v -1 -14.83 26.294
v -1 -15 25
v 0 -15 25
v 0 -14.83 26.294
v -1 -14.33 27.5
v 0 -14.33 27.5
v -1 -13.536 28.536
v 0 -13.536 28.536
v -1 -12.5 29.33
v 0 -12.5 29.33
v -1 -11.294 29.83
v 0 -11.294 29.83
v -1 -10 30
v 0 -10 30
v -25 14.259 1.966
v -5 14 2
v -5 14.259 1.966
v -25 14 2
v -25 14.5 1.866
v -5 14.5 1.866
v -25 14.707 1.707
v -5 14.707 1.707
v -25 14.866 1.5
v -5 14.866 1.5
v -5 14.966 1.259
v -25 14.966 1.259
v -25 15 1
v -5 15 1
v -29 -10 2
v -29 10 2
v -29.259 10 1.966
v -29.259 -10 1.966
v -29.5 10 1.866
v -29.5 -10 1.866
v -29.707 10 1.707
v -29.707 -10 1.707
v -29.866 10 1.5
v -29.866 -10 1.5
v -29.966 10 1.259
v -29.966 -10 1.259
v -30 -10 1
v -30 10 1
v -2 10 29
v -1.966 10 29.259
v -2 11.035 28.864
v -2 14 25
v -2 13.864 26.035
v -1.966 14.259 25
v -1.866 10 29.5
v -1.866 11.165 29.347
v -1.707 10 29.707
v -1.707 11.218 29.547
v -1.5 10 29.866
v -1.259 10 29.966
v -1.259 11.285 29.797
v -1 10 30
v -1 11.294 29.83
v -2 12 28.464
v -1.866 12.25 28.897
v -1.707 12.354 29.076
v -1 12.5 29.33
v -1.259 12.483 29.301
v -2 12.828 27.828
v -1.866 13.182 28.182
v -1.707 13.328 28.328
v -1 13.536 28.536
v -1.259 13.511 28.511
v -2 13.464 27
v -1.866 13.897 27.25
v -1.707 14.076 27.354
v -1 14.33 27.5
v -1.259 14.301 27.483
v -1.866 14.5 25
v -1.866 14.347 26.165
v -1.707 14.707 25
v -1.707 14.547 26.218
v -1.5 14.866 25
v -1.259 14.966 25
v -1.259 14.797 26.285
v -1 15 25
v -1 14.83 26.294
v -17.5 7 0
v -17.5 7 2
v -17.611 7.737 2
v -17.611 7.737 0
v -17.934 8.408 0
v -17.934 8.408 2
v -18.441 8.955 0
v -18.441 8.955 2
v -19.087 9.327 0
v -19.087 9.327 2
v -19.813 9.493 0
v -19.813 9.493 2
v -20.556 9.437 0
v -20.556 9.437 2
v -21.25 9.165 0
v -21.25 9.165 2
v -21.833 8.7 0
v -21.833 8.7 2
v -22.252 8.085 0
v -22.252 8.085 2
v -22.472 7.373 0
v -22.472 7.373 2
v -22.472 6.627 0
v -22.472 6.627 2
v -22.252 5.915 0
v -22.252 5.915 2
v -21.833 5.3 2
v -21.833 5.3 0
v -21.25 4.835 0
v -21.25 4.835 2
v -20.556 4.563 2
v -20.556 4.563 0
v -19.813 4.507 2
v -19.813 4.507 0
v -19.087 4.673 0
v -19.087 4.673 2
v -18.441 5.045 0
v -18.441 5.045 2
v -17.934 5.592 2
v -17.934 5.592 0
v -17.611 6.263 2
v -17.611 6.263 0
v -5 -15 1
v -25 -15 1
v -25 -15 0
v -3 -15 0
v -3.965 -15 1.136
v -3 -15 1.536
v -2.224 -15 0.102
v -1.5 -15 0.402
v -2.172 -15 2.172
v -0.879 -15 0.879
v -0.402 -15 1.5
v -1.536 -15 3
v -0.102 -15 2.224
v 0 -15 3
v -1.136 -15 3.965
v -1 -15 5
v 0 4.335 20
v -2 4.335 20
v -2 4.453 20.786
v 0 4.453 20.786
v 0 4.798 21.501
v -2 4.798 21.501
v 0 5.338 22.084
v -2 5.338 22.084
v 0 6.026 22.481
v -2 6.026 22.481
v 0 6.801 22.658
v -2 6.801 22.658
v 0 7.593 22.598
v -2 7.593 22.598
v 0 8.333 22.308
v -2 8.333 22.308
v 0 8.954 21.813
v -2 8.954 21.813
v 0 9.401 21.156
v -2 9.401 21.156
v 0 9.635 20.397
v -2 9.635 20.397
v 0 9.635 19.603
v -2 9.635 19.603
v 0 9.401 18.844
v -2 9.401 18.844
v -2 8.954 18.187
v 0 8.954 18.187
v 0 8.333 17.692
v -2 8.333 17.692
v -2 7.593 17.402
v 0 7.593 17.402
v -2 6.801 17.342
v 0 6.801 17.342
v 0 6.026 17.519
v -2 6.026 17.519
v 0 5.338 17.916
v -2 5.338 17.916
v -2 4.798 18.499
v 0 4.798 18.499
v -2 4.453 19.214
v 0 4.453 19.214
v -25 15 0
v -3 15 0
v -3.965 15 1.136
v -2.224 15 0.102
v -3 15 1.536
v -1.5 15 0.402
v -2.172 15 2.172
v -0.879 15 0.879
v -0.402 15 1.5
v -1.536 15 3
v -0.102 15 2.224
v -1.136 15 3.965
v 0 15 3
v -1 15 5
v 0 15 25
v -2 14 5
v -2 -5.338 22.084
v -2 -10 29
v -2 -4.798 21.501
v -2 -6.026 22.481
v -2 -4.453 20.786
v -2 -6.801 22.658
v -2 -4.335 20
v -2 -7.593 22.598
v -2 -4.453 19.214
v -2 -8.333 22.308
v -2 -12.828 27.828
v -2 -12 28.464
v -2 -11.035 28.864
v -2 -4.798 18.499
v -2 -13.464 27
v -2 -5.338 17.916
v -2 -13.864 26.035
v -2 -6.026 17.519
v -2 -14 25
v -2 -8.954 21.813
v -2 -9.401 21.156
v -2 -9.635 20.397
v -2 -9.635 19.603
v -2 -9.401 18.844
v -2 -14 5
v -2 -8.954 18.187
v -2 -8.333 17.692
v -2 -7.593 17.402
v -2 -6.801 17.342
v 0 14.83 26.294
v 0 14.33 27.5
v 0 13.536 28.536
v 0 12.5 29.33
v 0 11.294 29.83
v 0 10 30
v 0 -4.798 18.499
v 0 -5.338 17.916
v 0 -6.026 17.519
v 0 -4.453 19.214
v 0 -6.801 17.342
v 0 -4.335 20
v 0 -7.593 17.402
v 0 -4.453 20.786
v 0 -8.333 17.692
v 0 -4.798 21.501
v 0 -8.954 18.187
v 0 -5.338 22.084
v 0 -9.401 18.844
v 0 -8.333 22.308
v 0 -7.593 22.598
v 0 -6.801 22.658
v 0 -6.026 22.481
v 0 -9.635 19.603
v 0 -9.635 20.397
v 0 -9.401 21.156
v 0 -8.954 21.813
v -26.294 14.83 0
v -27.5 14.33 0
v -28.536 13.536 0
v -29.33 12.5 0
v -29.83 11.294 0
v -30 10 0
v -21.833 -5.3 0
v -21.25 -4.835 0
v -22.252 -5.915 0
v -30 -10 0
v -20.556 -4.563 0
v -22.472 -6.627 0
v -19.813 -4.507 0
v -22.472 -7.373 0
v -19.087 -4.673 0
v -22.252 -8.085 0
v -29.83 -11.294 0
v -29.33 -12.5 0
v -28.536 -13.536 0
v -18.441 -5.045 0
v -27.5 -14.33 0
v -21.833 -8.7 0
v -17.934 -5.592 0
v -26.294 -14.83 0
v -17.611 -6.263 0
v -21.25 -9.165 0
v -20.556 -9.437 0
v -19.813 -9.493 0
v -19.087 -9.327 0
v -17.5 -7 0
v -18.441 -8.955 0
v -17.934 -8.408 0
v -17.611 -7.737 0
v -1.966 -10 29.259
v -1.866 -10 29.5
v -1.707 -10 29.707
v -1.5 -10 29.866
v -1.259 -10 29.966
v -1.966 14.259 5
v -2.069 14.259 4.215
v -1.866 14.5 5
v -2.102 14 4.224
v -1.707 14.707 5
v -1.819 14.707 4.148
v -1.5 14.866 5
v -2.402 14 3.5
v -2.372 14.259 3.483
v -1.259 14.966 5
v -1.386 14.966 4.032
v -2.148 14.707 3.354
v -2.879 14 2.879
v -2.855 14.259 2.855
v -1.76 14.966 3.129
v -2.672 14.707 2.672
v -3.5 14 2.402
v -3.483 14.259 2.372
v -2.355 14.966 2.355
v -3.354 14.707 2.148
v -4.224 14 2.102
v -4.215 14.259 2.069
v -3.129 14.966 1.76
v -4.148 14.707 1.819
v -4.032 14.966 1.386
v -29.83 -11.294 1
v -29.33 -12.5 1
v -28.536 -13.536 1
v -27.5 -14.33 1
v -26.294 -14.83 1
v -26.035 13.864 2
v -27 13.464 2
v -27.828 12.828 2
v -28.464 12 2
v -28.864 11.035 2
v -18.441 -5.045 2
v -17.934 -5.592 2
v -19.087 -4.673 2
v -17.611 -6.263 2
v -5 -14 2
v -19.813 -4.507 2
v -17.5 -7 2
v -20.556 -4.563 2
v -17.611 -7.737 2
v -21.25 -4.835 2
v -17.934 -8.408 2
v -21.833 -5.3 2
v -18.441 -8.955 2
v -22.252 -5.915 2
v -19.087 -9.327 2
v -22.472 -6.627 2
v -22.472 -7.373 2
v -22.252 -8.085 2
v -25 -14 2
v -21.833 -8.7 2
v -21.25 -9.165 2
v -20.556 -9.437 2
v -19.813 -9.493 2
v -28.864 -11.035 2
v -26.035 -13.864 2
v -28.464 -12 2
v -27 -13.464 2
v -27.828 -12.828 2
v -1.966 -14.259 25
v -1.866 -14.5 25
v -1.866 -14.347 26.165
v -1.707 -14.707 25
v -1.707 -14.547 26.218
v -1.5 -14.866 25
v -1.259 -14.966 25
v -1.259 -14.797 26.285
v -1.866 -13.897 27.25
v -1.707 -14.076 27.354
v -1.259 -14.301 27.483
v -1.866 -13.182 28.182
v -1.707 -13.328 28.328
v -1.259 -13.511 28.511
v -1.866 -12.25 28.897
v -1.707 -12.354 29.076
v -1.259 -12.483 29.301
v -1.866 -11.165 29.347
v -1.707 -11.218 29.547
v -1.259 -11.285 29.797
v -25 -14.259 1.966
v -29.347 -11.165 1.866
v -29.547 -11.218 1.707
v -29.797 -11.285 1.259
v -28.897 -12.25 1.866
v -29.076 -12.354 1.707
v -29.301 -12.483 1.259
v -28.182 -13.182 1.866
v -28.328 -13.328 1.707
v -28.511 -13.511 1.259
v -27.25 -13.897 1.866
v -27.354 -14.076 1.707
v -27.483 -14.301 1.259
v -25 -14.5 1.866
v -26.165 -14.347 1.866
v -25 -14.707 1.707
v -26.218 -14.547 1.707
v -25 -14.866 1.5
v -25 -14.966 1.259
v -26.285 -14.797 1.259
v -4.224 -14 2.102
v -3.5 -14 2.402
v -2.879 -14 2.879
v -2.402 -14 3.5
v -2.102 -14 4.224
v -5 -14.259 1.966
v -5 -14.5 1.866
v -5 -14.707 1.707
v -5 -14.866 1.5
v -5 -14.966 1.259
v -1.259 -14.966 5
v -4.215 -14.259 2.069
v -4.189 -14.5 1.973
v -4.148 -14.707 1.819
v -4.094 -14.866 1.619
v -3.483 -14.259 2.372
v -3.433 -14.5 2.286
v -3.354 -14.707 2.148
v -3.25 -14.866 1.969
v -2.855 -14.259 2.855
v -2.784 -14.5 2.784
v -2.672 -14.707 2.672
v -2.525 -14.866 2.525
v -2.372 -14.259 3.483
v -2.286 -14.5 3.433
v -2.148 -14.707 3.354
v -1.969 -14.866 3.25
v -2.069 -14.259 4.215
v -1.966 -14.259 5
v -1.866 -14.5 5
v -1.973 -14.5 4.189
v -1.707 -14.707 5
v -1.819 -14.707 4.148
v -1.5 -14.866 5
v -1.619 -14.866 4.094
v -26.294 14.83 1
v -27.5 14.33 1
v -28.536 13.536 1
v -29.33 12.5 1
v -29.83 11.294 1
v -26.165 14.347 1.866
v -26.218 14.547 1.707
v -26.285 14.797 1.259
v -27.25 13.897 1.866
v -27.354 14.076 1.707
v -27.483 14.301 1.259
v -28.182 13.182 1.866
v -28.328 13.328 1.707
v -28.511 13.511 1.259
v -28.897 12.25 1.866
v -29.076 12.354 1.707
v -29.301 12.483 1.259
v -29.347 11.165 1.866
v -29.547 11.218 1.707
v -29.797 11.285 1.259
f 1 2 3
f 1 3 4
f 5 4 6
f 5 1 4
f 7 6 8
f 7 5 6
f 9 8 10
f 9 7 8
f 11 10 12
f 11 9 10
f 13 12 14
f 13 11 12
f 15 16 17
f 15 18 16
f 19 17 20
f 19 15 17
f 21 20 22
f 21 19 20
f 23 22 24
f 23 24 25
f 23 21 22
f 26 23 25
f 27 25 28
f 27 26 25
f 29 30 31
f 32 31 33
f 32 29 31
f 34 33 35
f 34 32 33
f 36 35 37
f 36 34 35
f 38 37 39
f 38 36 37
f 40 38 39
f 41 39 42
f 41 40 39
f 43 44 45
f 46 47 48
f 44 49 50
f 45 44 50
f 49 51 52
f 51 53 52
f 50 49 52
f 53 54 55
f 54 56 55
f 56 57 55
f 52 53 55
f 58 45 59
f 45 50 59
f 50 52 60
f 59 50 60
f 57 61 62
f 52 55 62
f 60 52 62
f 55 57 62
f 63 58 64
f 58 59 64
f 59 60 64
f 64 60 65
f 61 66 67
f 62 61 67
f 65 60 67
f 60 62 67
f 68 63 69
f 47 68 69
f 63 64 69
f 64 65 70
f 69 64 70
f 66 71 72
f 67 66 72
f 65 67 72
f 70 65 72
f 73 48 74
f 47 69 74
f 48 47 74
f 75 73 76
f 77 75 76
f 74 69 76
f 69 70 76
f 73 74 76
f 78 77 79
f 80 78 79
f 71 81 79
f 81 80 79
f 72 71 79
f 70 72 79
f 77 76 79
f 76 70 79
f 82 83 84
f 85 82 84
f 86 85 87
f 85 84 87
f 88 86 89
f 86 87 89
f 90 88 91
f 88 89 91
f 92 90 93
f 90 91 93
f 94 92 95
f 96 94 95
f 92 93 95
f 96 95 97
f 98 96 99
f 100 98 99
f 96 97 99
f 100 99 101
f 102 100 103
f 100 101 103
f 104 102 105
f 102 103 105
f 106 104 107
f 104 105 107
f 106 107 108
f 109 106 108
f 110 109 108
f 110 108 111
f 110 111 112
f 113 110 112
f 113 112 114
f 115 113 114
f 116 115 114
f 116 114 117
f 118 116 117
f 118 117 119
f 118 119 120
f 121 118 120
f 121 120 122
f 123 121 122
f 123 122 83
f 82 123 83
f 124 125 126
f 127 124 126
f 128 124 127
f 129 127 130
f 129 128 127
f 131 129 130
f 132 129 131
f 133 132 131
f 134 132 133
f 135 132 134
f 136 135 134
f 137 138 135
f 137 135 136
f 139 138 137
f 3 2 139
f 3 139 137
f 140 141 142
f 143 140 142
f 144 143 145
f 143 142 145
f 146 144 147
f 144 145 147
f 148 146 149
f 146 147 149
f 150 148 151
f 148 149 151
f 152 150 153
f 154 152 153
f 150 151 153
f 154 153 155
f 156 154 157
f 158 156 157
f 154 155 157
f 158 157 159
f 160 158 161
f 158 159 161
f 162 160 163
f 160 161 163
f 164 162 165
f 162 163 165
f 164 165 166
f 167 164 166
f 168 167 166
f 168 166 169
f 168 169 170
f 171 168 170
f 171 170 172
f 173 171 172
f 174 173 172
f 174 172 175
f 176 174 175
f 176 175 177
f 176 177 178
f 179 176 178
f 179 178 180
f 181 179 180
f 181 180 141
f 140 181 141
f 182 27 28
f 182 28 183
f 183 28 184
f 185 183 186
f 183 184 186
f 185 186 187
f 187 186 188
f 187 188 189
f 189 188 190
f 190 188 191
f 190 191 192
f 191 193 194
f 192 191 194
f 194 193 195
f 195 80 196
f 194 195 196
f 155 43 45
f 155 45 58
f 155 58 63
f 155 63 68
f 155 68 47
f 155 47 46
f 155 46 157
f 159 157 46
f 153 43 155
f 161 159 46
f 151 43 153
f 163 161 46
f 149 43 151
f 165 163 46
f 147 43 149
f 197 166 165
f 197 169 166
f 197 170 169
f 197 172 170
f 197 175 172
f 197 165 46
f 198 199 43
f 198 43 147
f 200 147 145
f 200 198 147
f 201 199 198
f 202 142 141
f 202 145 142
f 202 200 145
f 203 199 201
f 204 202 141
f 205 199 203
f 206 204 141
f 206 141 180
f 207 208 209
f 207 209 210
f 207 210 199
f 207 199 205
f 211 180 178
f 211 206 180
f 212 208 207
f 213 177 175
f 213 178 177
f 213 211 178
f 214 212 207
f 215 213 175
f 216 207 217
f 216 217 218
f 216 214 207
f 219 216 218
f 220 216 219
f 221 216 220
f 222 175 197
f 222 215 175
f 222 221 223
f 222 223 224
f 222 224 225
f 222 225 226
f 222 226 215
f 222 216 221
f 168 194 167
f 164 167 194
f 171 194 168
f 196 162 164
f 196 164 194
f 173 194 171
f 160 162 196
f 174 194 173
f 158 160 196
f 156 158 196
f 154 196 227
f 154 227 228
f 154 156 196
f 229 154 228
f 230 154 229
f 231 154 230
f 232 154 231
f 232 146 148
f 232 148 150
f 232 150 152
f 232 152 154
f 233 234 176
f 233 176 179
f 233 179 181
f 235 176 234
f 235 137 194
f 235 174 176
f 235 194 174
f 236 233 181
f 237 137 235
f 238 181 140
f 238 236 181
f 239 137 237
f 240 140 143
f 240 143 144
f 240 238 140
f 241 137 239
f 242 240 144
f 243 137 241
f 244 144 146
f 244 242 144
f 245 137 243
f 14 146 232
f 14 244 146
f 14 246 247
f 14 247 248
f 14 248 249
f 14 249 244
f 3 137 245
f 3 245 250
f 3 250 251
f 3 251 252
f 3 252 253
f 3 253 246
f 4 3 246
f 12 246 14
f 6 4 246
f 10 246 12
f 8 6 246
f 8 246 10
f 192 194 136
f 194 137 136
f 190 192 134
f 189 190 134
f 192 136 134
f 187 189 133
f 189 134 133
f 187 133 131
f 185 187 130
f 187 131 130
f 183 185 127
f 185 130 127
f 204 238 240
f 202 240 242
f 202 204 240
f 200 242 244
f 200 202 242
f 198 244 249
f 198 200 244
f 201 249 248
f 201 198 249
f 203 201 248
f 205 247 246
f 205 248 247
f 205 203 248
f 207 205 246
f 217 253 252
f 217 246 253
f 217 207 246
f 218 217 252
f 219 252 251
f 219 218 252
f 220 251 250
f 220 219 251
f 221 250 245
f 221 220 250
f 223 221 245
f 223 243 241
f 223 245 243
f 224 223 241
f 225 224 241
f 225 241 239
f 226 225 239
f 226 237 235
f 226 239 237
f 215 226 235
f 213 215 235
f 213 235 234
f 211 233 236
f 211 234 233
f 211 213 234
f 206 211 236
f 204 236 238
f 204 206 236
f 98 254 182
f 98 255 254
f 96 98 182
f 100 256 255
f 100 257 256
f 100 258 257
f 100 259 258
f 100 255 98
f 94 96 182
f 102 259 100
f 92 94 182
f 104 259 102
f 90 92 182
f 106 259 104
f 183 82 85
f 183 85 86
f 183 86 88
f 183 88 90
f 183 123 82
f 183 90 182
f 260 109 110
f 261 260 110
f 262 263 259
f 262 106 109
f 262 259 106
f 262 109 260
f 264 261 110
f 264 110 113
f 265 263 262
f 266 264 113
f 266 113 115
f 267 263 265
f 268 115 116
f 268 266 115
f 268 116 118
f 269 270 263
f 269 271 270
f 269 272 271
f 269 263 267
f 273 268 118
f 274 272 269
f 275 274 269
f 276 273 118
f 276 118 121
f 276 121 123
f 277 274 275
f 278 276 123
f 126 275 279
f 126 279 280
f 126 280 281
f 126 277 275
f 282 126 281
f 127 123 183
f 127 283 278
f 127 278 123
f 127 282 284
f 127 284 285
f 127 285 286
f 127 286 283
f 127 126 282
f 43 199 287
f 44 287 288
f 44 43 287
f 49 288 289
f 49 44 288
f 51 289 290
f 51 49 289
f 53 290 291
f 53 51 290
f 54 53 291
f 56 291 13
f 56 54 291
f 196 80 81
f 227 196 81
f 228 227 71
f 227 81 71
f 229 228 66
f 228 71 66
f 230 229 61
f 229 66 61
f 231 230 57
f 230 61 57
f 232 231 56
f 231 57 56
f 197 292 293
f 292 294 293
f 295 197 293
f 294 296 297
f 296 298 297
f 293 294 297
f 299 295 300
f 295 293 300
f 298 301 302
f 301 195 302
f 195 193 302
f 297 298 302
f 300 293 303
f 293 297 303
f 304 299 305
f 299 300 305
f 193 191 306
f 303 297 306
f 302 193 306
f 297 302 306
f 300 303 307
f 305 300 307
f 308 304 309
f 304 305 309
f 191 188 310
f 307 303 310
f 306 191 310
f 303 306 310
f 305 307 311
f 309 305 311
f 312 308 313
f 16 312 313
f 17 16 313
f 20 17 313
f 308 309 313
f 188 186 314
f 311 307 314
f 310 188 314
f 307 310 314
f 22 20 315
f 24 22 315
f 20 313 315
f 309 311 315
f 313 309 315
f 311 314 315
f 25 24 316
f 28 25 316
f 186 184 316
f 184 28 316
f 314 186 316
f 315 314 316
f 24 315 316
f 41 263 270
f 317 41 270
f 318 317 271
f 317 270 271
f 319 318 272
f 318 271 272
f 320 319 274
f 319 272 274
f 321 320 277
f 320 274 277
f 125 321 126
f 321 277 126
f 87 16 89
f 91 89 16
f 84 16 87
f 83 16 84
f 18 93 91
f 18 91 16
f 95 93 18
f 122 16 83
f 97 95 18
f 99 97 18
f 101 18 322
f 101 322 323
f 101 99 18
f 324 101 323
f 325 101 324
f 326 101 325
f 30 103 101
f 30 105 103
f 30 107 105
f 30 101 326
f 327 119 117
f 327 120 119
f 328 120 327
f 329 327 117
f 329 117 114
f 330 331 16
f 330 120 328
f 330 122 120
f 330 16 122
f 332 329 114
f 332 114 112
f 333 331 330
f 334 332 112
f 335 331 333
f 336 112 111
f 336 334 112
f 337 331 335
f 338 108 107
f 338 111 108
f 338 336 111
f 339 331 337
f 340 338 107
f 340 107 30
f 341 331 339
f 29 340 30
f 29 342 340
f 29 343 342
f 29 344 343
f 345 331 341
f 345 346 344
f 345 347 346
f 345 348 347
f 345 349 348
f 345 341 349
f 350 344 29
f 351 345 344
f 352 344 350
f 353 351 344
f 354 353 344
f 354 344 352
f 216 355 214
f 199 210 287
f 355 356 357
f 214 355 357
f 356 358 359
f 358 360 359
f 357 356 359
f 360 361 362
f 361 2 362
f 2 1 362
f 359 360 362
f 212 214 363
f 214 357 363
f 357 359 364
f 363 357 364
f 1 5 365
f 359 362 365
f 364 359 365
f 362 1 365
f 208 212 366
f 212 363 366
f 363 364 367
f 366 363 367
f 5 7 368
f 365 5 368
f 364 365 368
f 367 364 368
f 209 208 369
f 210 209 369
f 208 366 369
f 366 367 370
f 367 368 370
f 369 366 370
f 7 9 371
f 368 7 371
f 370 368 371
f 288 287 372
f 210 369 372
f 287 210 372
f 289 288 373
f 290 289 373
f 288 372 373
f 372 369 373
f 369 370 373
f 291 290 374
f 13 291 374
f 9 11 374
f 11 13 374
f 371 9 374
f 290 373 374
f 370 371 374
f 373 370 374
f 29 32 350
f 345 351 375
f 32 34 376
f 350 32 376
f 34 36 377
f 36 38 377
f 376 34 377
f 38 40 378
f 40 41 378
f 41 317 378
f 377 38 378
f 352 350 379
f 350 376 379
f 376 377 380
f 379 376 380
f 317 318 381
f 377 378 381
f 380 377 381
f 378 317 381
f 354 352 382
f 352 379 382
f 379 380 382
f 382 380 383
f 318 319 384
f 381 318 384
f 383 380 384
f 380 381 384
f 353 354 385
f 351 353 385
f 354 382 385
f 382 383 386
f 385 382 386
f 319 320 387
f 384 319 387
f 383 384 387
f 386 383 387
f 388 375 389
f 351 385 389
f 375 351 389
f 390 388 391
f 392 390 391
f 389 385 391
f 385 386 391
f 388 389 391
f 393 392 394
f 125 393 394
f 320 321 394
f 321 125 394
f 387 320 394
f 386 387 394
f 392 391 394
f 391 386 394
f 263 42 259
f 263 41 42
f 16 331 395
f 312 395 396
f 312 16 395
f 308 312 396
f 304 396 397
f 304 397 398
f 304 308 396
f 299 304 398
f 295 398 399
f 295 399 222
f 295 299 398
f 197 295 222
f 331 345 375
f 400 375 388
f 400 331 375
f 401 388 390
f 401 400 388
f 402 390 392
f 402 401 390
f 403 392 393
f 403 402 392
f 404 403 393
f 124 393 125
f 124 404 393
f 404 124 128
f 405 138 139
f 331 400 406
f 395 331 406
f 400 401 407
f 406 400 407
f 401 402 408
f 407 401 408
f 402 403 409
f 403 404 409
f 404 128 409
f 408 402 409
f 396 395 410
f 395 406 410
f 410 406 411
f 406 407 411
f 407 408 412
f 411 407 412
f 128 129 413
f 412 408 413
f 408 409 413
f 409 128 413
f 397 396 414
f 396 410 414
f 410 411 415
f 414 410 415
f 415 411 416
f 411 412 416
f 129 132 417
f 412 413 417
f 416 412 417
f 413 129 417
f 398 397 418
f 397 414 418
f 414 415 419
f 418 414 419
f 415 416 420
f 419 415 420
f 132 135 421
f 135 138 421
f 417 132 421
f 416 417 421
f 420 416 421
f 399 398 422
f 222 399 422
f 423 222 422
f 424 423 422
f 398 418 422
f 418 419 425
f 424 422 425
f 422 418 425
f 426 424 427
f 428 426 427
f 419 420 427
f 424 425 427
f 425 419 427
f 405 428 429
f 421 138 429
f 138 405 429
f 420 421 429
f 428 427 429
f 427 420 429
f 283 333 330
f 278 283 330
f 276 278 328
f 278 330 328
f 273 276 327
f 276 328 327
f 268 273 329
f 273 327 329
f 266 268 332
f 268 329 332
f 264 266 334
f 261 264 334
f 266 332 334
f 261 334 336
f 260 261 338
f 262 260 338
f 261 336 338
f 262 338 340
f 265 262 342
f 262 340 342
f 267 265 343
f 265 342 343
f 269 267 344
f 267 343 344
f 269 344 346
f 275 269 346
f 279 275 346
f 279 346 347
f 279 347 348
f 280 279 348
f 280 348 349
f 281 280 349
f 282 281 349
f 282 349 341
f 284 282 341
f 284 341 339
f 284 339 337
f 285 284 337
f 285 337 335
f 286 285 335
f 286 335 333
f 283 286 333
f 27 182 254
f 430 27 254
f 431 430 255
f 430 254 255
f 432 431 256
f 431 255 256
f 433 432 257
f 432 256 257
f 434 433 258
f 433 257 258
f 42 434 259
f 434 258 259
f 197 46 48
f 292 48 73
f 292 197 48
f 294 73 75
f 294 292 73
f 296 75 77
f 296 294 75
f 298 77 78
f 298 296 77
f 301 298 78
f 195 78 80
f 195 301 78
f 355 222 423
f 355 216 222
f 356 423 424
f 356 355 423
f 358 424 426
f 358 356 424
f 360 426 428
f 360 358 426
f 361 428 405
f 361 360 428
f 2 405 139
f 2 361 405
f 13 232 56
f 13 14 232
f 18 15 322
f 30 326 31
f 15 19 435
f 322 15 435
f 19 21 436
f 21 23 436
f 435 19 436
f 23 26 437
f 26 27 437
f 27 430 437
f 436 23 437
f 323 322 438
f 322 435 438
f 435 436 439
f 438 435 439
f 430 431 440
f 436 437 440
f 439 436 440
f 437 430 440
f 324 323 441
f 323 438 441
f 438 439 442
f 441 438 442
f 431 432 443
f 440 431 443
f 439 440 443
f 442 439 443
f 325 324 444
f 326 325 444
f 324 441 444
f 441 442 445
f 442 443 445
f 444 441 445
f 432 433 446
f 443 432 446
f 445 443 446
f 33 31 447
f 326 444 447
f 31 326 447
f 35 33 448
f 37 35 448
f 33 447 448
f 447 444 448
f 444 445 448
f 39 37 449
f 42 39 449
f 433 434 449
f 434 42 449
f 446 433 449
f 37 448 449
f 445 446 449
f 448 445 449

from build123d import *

# Parameters (mm, degrees)
F1_DEPTH = 15
F2_R     = 3
F3_R     = 2.5
F4_DEPTH = 2.001
F5_R     = 5
F6_R     = 1
F7_R     = 2.6650989984
F8_DEPTH = 2.001


# Not quite as in the source:
# - a pattern or mirror of a feature is missing from the dataset's text; its kind, count and spacing are read off the source's solid


with BuildPart() as f1:
    # F0 (on Front) → F1 (new body, symmetric)
    with BuildSketch(Plane.XZ):
        Polygon((-30, 2), (-30, 0), (0, 0), (0, 30), (-2, 30), (-2, 2), align=None)
    extrude(amount=F1_DEPTH, both=True)

    # F2
    f2_edges = [f1.edges().sort_by_distance(p)[0] for p in [
        (0, 0, 0),
        (-2, 0, 2),
    ]]
    fillet(f2_edges, radius=F2_R)

    # F3 (on face) → F4 (cut, through all)
    with BuildSketch(Plane.XY.offset(2)):
        with Locations((-20, 7)):
            Circle(F3_R)
        with Locations((-20, -7)):
            Circle(F3_R)
    extrude(amount=-F4_DEPTH, mode=Mode.SUBTRACT)

    # F5
    f5_edges = [f1.edges().sort_by_distance(p)[0] for p in [
        (-30, -15, 1),
        (-30, 15, 1),
        (-1, -15, 30),
        (-1, 15, 30),
    ]]
    fillet(f5_edges, radius=F5_R)

    # F6
    f6_edges = [f1.edges().sort_by_distance(p)[0] for p in [
        (-15, 15, 2),
        (-28.535534, 13.535534, 2),
        (-30, 0, 2),
        (-15, -15, 2),
        (-28.535534, -13.535534, 2),
        (-2.87868, 15, 2.87868),
        (-2, 15, 15),
        (-2.87868, -15, 2.87868),
        (-2, -15, 15),
        (-2, 13.535534, 28.535534),
        (-2, 0, 30),
        (-2, -13.535534, 28.535534),
    ]]
    fillet(f6_edges, radius=F6_R)

    # F7 (on face) → F8 (cut, through all)
    with BuildSketch(Plane(origin=(-2, 0, 0), x_dir=(0, -1, 0), z_dir=(-1, 0, 0))):
        with Locations((-7, 20)):
            Circle(F7_R)
    f8 = extrude(amount=-F8_DEPTH, mode=Mode.SUBTRACT)

    # F8_copies: F8 across plane
    add(f8.mirror(Plane(origin=(0, 0, 0), x_dir=(0, 0, -1), z_dir=(0, -1, 0))), mode=Mode.SUBTRACT)


solid = f1.part
